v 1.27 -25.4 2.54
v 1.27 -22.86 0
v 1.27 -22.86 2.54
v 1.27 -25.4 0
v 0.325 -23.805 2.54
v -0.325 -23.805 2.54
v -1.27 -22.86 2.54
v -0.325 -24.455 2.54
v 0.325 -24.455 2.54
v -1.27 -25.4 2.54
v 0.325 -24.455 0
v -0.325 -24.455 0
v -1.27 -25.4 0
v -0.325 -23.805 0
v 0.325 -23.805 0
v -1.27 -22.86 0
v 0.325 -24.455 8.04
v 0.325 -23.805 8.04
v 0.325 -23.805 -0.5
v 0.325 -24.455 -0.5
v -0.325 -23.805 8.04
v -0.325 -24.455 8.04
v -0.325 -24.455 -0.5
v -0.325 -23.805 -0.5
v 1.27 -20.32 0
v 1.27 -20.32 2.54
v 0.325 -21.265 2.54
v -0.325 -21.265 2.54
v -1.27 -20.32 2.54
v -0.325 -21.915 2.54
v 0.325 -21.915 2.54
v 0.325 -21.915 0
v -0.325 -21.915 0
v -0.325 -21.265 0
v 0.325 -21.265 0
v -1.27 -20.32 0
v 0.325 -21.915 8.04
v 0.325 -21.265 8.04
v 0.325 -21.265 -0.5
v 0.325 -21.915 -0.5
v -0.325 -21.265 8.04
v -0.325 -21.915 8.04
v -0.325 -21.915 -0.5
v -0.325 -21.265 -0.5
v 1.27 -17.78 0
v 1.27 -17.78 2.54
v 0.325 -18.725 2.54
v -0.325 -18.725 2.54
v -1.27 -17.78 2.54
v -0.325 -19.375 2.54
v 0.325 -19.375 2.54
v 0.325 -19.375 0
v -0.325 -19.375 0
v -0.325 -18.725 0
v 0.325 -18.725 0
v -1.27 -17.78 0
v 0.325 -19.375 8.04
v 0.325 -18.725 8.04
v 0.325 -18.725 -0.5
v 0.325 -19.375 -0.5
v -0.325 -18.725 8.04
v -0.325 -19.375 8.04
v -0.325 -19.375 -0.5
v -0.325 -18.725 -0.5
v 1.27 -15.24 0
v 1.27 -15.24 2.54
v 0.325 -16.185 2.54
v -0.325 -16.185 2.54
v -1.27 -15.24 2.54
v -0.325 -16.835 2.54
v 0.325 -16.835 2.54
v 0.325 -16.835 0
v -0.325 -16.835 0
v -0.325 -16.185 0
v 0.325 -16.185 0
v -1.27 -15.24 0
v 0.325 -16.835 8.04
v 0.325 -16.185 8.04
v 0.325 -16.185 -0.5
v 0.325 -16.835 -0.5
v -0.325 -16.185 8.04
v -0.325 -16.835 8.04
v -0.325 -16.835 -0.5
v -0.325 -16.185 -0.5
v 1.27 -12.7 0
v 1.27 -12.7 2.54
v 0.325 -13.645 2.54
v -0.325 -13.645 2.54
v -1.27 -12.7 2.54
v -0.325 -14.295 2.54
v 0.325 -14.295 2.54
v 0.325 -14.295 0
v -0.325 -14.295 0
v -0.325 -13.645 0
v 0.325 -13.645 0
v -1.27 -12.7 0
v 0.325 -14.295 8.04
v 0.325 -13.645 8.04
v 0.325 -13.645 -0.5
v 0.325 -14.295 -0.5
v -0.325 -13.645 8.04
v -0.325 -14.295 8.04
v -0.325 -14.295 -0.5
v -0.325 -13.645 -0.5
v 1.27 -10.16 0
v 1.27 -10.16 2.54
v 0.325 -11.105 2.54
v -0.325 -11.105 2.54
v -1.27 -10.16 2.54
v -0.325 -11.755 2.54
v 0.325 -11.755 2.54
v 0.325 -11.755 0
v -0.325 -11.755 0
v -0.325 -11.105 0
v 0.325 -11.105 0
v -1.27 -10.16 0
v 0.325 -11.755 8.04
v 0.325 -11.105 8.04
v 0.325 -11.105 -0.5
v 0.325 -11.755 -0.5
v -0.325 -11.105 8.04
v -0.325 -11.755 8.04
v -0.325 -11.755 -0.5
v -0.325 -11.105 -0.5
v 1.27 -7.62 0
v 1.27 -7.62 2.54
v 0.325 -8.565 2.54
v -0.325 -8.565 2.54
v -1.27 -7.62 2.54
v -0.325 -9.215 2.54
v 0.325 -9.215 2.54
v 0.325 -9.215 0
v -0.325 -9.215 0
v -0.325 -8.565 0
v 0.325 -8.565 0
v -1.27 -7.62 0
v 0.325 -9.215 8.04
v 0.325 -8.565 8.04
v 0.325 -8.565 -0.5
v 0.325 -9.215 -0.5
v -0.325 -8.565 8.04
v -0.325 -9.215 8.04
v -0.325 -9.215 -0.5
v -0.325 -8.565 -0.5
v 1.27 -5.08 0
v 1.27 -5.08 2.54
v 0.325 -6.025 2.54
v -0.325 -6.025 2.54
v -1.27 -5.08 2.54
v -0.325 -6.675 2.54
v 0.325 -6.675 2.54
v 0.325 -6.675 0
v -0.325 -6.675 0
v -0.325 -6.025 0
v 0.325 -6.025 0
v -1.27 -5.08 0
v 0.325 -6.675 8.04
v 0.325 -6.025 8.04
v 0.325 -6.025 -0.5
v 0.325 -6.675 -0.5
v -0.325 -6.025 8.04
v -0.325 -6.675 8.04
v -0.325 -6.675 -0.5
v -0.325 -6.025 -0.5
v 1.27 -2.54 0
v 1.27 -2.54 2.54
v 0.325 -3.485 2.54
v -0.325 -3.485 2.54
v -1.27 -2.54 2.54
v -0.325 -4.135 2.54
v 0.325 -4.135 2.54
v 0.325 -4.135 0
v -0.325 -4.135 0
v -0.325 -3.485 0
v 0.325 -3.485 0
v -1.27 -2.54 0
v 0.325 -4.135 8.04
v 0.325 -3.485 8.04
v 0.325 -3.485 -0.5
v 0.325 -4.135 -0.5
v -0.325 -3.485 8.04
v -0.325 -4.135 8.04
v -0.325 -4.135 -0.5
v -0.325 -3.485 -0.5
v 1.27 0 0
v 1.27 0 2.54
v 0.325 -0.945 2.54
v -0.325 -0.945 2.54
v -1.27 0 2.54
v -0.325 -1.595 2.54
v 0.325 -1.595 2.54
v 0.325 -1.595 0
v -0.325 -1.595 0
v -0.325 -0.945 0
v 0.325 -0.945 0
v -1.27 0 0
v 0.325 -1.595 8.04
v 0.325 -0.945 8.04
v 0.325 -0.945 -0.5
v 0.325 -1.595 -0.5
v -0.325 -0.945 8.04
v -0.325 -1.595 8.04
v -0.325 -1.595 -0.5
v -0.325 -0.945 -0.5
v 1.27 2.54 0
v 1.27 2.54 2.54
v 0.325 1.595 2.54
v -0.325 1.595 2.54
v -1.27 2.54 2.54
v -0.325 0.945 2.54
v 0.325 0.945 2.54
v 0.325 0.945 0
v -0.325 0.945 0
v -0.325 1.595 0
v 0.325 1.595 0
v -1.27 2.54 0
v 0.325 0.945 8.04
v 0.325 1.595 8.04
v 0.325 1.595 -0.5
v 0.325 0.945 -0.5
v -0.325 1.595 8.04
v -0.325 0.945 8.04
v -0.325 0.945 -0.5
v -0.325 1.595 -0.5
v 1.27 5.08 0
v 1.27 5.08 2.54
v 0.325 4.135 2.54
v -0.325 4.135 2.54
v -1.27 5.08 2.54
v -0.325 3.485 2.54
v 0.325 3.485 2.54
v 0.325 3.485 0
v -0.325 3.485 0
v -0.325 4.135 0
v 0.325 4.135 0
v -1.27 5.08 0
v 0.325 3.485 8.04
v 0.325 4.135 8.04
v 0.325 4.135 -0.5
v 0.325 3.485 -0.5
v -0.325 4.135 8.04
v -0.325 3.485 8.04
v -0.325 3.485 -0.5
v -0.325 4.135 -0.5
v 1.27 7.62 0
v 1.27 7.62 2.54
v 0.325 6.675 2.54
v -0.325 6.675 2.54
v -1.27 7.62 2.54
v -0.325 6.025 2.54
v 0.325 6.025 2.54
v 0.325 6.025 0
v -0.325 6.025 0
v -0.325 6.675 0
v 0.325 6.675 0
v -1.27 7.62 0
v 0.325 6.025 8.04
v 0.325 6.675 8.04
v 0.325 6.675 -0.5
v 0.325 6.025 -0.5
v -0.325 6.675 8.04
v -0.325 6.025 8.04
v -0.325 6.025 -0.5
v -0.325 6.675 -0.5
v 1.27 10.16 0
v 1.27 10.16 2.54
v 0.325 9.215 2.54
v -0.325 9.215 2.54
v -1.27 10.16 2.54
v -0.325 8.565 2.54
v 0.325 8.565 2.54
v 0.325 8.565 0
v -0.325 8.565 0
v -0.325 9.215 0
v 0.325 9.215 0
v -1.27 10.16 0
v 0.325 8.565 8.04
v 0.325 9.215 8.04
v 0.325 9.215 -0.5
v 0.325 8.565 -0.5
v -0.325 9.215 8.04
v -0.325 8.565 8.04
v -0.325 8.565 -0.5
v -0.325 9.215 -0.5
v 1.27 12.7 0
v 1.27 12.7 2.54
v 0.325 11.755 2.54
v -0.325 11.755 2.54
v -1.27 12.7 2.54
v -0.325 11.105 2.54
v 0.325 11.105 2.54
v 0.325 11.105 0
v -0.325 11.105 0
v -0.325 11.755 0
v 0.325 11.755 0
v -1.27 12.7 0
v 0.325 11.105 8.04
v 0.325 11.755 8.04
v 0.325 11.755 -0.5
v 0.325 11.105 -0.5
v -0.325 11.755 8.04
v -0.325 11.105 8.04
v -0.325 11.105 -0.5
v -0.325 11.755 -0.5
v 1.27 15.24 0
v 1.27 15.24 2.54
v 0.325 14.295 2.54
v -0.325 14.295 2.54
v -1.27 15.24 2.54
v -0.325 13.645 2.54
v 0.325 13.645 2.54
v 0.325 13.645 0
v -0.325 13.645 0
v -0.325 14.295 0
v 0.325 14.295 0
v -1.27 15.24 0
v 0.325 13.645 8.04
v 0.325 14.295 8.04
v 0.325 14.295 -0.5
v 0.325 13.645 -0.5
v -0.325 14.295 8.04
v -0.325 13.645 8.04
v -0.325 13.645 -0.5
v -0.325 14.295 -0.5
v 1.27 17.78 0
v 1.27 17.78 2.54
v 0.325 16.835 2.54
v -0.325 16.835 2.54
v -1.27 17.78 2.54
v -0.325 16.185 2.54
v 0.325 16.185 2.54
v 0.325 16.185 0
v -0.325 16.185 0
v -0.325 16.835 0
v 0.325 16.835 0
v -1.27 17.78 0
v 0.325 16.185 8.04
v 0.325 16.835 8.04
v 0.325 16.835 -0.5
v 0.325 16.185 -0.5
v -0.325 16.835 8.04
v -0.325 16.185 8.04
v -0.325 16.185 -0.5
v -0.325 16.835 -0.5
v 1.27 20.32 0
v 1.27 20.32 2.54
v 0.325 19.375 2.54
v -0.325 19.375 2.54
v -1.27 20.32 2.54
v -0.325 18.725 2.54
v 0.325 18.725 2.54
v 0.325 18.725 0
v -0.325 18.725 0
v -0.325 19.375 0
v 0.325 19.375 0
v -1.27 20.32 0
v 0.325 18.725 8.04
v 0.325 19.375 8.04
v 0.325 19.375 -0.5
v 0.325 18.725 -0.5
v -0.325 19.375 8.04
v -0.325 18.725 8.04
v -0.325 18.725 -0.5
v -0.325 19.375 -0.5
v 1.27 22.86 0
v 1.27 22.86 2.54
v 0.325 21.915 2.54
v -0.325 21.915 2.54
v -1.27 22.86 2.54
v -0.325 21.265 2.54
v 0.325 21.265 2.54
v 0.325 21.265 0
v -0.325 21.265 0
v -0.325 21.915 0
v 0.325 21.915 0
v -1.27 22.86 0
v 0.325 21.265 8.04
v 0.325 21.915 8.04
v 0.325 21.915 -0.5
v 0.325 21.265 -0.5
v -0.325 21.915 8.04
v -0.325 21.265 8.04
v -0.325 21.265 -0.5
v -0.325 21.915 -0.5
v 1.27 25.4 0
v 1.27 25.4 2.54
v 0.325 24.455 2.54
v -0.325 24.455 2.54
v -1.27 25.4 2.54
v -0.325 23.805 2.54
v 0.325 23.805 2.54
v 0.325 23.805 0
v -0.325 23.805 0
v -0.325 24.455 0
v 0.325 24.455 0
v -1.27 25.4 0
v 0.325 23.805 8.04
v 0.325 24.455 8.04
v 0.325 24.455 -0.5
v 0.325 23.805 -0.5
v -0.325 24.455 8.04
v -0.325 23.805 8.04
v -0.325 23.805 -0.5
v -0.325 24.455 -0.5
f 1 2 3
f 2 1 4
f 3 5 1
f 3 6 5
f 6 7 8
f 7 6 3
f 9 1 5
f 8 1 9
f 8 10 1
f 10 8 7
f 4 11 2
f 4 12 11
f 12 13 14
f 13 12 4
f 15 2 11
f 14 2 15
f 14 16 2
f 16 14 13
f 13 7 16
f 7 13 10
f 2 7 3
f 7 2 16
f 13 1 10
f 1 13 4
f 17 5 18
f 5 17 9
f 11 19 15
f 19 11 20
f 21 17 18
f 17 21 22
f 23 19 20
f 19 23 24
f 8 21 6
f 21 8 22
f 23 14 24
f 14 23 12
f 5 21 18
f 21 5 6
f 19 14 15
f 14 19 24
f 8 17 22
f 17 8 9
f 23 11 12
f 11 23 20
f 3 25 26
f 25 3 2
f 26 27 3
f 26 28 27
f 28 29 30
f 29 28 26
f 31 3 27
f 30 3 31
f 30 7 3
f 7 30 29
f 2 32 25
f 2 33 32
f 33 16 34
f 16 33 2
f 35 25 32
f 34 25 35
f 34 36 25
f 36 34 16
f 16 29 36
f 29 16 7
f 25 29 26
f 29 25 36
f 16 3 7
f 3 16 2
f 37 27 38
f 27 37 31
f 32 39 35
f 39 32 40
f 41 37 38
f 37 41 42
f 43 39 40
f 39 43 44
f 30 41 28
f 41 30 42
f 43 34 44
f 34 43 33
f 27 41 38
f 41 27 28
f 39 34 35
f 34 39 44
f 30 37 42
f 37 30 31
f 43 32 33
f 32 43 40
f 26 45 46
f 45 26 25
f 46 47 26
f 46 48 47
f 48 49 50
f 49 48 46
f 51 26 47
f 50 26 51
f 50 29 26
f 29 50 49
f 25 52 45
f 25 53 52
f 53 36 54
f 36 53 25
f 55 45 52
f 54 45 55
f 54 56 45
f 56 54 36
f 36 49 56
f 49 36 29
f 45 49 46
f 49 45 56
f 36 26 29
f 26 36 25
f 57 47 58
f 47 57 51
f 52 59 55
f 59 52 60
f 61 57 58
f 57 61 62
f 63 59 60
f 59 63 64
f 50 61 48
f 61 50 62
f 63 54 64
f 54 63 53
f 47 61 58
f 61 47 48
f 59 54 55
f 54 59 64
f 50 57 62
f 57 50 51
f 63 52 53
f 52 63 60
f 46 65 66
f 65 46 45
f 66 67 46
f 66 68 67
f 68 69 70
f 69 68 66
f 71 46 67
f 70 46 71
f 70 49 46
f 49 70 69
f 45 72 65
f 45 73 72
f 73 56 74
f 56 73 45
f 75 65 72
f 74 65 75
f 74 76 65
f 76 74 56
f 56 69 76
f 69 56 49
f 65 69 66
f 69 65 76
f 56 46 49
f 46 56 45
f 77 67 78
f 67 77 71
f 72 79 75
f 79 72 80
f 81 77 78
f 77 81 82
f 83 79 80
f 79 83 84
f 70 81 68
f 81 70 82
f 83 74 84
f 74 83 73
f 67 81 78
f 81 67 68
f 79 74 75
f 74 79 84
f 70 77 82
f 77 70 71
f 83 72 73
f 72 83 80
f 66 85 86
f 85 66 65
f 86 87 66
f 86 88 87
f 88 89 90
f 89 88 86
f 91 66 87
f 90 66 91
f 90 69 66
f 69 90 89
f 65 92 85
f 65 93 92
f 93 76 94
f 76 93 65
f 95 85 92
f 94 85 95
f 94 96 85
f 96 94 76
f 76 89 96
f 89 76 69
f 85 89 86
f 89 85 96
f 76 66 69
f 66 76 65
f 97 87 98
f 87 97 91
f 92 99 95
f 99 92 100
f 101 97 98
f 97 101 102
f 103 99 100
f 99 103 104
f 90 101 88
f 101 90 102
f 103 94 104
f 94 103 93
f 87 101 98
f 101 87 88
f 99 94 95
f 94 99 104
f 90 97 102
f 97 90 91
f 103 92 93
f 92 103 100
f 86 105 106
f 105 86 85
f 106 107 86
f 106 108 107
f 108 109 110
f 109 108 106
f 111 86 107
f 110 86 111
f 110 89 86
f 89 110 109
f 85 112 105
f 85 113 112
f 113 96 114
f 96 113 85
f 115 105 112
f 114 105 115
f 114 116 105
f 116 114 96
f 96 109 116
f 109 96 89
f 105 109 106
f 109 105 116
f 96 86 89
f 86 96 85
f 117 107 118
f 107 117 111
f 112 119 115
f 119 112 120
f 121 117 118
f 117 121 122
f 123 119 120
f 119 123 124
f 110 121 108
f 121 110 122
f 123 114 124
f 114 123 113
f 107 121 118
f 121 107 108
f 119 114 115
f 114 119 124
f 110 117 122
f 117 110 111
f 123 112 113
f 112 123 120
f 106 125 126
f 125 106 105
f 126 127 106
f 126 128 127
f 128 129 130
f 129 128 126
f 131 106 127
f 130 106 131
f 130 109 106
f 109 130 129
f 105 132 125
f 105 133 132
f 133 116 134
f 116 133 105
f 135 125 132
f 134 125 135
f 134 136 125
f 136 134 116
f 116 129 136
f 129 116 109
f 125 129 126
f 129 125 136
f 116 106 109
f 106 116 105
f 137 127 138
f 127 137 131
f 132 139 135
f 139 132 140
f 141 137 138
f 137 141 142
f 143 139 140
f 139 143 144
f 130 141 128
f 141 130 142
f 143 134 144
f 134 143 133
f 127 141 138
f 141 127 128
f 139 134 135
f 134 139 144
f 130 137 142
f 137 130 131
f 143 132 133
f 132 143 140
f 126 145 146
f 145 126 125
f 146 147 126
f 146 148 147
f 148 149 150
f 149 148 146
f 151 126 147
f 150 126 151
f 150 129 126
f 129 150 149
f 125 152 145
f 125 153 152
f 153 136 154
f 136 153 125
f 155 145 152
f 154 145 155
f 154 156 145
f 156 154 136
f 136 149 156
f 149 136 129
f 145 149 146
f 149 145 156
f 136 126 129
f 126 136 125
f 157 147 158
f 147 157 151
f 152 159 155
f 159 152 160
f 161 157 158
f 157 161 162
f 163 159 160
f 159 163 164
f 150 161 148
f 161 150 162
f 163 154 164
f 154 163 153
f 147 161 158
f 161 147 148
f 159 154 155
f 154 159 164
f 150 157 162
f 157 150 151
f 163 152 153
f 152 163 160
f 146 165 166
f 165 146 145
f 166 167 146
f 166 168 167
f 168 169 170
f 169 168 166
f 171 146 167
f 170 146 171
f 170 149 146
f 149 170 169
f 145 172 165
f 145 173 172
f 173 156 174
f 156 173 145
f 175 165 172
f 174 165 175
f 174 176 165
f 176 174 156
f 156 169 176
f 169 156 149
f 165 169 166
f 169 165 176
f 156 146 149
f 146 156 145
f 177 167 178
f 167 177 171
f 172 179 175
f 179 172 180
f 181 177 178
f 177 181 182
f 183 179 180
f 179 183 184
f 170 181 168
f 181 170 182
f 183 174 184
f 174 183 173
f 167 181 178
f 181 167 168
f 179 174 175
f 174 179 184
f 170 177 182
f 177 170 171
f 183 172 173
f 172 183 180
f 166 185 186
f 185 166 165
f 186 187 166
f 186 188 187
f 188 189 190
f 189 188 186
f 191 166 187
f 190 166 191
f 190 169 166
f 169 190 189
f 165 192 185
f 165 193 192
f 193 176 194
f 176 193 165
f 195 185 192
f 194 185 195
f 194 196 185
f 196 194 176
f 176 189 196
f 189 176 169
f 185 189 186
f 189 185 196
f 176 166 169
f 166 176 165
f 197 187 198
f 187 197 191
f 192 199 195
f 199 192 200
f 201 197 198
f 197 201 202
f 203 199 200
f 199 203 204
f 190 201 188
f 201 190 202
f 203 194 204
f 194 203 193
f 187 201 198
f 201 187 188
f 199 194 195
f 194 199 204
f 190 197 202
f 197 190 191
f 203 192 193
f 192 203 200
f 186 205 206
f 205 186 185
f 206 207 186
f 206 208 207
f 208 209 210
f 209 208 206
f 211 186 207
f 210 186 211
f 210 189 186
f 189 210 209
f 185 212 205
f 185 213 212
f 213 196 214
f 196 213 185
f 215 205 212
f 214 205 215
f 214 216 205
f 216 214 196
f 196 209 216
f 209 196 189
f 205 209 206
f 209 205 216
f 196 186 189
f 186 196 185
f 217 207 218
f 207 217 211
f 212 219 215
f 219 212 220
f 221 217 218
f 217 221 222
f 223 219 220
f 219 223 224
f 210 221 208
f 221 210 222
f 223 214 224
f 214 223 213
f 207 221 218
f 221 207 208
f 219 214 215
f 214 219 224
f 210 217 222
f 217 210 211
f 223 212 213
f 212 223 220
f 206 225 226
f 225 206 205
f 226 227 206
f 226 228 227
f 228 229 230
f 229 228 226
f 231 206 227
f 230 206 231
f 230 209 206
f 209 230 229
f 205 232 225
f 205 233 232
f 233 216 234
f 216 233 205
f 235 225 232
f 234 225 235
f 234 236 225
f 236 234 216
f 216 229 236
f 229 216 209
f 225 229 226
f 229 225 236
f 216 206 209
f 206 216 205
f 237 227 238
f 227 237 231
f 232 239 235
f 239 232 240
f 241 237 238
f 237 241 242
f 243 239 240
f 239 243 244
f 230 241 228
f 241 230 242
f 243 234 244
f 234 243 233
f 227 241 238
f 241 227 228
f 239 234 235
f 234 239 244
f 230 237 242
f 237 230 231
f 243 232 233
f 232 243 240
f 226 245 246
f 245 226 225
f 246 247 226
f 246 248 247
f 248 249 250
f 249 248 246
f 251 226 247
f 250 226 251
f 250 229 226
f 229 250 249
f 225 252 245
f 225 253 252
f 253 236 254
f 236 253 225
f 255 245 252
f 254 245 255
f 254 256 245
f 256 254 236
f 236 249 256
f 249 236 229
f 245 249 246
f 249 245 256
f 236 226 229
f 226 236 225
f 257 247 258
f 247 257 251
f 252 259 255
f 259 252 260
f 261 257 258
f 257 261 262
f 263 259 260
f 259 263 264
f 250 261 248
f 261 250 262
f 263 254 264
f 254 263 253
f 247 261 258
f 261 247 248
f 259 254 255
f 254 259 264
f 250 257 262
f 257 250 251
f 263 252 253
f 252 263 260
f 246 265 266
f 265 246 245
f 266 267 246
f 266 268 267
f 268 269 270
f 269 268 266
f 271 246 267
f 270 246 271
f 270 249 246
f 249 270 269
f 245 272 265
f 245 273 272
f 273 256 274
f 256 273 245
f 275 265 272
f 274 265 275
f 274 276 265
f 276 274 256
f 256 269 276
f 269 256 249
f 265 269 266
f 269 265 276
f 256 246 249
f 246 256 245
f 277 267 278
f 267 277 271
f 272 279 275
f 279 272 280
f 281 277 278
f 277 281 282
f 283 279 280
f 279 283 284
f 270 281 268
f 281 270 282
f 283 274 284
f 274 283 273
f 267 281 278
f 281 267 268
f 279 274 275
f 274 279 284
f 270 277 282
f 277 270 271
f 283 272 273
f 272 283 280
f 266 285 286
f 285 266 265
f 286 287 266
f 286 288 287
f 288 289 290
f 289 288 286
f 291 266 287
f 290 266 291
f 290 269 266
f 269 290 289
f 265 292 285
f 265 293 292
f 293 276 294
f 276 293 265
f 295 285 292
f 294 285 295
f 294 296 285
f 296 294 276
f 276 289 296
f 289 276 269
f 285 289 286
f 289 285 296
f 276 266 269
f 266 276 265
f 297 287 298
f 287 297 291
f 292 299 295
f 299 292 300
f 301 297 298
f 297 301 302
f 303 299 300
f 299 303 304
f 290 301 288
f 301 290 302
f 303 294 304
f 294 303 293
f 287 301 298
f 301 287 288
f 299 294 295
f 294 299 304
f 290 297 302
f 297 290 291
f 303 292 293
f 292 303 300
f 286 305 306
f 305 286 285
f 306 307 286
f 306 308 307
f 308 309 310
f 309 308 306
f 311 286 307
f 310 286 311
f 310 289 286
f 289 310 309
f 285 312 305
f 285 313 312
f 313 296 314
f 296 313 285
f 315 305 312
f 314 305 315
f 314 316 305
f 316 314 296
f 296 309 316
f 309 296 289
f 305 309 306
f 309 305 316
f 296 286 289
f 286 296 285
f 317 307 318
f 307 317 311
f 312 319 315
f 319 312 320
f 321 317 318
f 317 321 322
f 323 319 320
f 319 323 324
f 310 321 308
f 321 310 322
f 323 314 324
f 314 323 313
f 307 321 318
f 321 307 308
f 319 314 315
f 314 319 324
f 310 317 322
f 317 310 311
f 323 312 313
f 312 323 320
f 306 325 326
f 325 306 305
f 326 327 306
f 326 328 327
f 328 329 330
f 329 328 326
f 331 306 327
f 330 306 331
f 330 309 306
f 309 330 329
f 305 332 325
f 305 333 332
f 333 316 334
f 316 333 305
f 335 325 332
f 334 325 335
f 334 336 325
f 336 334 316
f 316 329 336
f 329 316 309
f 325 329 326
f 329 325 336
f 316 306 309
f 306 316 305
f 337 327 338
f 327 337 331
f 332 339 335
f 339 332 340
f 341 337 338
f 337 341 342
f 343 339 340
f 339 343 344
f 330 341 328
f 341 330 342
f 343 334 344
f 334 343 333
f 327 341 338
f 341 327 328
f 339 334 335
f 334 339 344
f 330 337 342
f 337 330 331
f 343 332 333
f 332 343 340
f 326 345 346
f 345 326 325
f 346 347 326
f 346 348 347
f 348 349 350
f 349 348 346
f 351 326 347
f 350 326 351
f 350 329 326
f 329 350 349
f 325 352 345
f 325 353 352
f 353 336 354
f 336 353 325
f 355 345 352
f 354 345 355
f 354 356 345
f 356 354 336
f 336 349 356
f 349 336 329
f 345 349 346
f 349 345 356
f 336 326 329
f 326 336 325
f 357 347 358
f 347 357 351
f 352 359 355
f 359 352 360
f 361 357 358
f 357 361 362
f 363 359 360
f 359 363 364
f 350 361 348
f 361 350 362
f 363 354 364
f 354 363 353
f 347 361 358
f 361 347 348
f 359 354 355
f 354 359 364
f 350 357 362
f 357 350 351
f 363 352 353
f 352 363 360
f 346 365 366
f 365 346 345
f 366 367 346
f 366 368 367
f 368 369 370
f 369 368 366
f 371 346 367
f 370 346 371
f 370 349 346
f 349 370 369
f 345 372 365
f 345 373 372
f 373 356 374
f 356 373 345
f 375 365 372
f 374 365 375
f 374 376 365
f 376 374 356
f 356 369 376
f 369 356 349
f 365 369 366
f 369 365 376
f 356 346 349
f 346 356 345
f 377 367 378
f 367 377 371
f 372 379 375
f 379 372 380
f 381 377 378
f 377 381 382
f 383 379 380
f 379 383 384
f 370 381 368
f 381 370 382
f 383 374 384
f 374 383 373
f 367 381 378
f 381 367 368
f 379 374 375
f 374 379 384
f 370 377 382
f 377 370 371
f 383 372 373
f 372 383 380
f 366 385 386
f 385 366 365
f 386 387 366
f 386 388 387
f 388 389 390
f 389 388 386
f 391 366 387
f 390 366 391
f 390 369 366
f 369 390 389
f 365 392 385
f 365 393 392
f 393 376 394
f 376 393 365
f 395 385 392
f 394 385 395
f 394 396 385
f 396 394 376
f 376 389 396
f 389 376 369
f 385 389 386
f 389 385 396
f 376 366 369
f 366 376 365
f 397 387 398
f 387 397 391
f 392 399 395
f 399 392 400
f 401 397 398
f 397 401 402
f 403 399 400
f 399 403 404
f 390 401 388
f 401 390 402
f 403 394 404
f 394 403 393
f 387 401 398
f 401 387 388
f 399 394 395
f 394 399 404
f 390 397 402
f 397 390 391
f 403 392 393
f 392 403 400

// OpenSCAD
include <../colors.scad>
include <../parameters.scad>

module pin_header_item(base_size,
                       pin_colr=metallic_yellow_1,
                       base_colr=matte_black,
                       pin_size,
                       z_offset=0,
                       l_len,) {
  header_x = base_size[0];
  header_y = base_size[1];

  pin_x = pin_size[0];
  pin_y = pin_size[1];
  pin_height = pin_size[2];

  union() {
    color(base_colr) {
      cube(base_size);
    }
    color(pin_colr) {
      translate([(header_x - pin_x) / 2,
                 (header_y - pin_y) / 2,
                 -z_offset]) {
        cube([pin_x, pin_y, pin_height]);

        if (!is_undef(l_len)) {
          translate([-l_len + pin_x, 0, pin_height]) {
            cube([l_len, pin_x, pin_y]);
          }
        }
      }
    }
    children();
  }
}

module pin_headers(cols,
                   rows,
                   pin_colr=metallic_yellow_1,
                   base_colr=matte_black,
                   header_width,
                   header_height,
                   header_y_width,
                   pin_height,
                   l_len,
                   p,
                   z_offset=0,
                   center=false) {
  header_y_width = is_undef(header_y_width) ? header_width : header_y_width ;
  total_x = header_width * rows;
  total_y = header_y_width * cols;

  translate([center ? -total_x / 2 : 0, center ? - total_y / 2 : 0, 0]) {

    for (y = [0 : (cols -1)]) {
      for (x = [0 : (rows  - 1)]) {
        translate([header_width * x, header_y_width * y, 0]) {
          union() {
            pin_header_item(base_size=[header_width, header_y_width, header_height],
                            pin_size=[p, p, pin_height],
                            z_offset=z_offset,
                            pin_colr=pin_colr,
                            l_len=l_len,
                            base_colr=base_colr) {
              $y = y;
              $x = x;
              children();
            }
          }
        }
      }
    }
  }
}

module rpi_pin_headers(center=false,
                       z_offset=rpi_thickness / 2 + 0.5,
                       pin_height=rpi_pin_height,
                       header_height=rpi_pin_header_height) {
  pin_headers(cols=rpi_pin_headers_cols,
              rows=rpi_pin_headers_rows,
              header_width=rpi_pin_header_width,
              header_height=header_height,
              pin_height=pin_height,
              z_offset=z_offset,
              p=0.65,
              center=center);
}

rotate([0, 0, 0]) {
  pin_headers(cols=20,
              rows=1,
              header_width=rpi_pin_header_width,
              header_height=rpi_pin_header_height,
              pin_height=rpi_pin_height,
              z_offset=0.5,
              center=true,
              p=0.65);
}
